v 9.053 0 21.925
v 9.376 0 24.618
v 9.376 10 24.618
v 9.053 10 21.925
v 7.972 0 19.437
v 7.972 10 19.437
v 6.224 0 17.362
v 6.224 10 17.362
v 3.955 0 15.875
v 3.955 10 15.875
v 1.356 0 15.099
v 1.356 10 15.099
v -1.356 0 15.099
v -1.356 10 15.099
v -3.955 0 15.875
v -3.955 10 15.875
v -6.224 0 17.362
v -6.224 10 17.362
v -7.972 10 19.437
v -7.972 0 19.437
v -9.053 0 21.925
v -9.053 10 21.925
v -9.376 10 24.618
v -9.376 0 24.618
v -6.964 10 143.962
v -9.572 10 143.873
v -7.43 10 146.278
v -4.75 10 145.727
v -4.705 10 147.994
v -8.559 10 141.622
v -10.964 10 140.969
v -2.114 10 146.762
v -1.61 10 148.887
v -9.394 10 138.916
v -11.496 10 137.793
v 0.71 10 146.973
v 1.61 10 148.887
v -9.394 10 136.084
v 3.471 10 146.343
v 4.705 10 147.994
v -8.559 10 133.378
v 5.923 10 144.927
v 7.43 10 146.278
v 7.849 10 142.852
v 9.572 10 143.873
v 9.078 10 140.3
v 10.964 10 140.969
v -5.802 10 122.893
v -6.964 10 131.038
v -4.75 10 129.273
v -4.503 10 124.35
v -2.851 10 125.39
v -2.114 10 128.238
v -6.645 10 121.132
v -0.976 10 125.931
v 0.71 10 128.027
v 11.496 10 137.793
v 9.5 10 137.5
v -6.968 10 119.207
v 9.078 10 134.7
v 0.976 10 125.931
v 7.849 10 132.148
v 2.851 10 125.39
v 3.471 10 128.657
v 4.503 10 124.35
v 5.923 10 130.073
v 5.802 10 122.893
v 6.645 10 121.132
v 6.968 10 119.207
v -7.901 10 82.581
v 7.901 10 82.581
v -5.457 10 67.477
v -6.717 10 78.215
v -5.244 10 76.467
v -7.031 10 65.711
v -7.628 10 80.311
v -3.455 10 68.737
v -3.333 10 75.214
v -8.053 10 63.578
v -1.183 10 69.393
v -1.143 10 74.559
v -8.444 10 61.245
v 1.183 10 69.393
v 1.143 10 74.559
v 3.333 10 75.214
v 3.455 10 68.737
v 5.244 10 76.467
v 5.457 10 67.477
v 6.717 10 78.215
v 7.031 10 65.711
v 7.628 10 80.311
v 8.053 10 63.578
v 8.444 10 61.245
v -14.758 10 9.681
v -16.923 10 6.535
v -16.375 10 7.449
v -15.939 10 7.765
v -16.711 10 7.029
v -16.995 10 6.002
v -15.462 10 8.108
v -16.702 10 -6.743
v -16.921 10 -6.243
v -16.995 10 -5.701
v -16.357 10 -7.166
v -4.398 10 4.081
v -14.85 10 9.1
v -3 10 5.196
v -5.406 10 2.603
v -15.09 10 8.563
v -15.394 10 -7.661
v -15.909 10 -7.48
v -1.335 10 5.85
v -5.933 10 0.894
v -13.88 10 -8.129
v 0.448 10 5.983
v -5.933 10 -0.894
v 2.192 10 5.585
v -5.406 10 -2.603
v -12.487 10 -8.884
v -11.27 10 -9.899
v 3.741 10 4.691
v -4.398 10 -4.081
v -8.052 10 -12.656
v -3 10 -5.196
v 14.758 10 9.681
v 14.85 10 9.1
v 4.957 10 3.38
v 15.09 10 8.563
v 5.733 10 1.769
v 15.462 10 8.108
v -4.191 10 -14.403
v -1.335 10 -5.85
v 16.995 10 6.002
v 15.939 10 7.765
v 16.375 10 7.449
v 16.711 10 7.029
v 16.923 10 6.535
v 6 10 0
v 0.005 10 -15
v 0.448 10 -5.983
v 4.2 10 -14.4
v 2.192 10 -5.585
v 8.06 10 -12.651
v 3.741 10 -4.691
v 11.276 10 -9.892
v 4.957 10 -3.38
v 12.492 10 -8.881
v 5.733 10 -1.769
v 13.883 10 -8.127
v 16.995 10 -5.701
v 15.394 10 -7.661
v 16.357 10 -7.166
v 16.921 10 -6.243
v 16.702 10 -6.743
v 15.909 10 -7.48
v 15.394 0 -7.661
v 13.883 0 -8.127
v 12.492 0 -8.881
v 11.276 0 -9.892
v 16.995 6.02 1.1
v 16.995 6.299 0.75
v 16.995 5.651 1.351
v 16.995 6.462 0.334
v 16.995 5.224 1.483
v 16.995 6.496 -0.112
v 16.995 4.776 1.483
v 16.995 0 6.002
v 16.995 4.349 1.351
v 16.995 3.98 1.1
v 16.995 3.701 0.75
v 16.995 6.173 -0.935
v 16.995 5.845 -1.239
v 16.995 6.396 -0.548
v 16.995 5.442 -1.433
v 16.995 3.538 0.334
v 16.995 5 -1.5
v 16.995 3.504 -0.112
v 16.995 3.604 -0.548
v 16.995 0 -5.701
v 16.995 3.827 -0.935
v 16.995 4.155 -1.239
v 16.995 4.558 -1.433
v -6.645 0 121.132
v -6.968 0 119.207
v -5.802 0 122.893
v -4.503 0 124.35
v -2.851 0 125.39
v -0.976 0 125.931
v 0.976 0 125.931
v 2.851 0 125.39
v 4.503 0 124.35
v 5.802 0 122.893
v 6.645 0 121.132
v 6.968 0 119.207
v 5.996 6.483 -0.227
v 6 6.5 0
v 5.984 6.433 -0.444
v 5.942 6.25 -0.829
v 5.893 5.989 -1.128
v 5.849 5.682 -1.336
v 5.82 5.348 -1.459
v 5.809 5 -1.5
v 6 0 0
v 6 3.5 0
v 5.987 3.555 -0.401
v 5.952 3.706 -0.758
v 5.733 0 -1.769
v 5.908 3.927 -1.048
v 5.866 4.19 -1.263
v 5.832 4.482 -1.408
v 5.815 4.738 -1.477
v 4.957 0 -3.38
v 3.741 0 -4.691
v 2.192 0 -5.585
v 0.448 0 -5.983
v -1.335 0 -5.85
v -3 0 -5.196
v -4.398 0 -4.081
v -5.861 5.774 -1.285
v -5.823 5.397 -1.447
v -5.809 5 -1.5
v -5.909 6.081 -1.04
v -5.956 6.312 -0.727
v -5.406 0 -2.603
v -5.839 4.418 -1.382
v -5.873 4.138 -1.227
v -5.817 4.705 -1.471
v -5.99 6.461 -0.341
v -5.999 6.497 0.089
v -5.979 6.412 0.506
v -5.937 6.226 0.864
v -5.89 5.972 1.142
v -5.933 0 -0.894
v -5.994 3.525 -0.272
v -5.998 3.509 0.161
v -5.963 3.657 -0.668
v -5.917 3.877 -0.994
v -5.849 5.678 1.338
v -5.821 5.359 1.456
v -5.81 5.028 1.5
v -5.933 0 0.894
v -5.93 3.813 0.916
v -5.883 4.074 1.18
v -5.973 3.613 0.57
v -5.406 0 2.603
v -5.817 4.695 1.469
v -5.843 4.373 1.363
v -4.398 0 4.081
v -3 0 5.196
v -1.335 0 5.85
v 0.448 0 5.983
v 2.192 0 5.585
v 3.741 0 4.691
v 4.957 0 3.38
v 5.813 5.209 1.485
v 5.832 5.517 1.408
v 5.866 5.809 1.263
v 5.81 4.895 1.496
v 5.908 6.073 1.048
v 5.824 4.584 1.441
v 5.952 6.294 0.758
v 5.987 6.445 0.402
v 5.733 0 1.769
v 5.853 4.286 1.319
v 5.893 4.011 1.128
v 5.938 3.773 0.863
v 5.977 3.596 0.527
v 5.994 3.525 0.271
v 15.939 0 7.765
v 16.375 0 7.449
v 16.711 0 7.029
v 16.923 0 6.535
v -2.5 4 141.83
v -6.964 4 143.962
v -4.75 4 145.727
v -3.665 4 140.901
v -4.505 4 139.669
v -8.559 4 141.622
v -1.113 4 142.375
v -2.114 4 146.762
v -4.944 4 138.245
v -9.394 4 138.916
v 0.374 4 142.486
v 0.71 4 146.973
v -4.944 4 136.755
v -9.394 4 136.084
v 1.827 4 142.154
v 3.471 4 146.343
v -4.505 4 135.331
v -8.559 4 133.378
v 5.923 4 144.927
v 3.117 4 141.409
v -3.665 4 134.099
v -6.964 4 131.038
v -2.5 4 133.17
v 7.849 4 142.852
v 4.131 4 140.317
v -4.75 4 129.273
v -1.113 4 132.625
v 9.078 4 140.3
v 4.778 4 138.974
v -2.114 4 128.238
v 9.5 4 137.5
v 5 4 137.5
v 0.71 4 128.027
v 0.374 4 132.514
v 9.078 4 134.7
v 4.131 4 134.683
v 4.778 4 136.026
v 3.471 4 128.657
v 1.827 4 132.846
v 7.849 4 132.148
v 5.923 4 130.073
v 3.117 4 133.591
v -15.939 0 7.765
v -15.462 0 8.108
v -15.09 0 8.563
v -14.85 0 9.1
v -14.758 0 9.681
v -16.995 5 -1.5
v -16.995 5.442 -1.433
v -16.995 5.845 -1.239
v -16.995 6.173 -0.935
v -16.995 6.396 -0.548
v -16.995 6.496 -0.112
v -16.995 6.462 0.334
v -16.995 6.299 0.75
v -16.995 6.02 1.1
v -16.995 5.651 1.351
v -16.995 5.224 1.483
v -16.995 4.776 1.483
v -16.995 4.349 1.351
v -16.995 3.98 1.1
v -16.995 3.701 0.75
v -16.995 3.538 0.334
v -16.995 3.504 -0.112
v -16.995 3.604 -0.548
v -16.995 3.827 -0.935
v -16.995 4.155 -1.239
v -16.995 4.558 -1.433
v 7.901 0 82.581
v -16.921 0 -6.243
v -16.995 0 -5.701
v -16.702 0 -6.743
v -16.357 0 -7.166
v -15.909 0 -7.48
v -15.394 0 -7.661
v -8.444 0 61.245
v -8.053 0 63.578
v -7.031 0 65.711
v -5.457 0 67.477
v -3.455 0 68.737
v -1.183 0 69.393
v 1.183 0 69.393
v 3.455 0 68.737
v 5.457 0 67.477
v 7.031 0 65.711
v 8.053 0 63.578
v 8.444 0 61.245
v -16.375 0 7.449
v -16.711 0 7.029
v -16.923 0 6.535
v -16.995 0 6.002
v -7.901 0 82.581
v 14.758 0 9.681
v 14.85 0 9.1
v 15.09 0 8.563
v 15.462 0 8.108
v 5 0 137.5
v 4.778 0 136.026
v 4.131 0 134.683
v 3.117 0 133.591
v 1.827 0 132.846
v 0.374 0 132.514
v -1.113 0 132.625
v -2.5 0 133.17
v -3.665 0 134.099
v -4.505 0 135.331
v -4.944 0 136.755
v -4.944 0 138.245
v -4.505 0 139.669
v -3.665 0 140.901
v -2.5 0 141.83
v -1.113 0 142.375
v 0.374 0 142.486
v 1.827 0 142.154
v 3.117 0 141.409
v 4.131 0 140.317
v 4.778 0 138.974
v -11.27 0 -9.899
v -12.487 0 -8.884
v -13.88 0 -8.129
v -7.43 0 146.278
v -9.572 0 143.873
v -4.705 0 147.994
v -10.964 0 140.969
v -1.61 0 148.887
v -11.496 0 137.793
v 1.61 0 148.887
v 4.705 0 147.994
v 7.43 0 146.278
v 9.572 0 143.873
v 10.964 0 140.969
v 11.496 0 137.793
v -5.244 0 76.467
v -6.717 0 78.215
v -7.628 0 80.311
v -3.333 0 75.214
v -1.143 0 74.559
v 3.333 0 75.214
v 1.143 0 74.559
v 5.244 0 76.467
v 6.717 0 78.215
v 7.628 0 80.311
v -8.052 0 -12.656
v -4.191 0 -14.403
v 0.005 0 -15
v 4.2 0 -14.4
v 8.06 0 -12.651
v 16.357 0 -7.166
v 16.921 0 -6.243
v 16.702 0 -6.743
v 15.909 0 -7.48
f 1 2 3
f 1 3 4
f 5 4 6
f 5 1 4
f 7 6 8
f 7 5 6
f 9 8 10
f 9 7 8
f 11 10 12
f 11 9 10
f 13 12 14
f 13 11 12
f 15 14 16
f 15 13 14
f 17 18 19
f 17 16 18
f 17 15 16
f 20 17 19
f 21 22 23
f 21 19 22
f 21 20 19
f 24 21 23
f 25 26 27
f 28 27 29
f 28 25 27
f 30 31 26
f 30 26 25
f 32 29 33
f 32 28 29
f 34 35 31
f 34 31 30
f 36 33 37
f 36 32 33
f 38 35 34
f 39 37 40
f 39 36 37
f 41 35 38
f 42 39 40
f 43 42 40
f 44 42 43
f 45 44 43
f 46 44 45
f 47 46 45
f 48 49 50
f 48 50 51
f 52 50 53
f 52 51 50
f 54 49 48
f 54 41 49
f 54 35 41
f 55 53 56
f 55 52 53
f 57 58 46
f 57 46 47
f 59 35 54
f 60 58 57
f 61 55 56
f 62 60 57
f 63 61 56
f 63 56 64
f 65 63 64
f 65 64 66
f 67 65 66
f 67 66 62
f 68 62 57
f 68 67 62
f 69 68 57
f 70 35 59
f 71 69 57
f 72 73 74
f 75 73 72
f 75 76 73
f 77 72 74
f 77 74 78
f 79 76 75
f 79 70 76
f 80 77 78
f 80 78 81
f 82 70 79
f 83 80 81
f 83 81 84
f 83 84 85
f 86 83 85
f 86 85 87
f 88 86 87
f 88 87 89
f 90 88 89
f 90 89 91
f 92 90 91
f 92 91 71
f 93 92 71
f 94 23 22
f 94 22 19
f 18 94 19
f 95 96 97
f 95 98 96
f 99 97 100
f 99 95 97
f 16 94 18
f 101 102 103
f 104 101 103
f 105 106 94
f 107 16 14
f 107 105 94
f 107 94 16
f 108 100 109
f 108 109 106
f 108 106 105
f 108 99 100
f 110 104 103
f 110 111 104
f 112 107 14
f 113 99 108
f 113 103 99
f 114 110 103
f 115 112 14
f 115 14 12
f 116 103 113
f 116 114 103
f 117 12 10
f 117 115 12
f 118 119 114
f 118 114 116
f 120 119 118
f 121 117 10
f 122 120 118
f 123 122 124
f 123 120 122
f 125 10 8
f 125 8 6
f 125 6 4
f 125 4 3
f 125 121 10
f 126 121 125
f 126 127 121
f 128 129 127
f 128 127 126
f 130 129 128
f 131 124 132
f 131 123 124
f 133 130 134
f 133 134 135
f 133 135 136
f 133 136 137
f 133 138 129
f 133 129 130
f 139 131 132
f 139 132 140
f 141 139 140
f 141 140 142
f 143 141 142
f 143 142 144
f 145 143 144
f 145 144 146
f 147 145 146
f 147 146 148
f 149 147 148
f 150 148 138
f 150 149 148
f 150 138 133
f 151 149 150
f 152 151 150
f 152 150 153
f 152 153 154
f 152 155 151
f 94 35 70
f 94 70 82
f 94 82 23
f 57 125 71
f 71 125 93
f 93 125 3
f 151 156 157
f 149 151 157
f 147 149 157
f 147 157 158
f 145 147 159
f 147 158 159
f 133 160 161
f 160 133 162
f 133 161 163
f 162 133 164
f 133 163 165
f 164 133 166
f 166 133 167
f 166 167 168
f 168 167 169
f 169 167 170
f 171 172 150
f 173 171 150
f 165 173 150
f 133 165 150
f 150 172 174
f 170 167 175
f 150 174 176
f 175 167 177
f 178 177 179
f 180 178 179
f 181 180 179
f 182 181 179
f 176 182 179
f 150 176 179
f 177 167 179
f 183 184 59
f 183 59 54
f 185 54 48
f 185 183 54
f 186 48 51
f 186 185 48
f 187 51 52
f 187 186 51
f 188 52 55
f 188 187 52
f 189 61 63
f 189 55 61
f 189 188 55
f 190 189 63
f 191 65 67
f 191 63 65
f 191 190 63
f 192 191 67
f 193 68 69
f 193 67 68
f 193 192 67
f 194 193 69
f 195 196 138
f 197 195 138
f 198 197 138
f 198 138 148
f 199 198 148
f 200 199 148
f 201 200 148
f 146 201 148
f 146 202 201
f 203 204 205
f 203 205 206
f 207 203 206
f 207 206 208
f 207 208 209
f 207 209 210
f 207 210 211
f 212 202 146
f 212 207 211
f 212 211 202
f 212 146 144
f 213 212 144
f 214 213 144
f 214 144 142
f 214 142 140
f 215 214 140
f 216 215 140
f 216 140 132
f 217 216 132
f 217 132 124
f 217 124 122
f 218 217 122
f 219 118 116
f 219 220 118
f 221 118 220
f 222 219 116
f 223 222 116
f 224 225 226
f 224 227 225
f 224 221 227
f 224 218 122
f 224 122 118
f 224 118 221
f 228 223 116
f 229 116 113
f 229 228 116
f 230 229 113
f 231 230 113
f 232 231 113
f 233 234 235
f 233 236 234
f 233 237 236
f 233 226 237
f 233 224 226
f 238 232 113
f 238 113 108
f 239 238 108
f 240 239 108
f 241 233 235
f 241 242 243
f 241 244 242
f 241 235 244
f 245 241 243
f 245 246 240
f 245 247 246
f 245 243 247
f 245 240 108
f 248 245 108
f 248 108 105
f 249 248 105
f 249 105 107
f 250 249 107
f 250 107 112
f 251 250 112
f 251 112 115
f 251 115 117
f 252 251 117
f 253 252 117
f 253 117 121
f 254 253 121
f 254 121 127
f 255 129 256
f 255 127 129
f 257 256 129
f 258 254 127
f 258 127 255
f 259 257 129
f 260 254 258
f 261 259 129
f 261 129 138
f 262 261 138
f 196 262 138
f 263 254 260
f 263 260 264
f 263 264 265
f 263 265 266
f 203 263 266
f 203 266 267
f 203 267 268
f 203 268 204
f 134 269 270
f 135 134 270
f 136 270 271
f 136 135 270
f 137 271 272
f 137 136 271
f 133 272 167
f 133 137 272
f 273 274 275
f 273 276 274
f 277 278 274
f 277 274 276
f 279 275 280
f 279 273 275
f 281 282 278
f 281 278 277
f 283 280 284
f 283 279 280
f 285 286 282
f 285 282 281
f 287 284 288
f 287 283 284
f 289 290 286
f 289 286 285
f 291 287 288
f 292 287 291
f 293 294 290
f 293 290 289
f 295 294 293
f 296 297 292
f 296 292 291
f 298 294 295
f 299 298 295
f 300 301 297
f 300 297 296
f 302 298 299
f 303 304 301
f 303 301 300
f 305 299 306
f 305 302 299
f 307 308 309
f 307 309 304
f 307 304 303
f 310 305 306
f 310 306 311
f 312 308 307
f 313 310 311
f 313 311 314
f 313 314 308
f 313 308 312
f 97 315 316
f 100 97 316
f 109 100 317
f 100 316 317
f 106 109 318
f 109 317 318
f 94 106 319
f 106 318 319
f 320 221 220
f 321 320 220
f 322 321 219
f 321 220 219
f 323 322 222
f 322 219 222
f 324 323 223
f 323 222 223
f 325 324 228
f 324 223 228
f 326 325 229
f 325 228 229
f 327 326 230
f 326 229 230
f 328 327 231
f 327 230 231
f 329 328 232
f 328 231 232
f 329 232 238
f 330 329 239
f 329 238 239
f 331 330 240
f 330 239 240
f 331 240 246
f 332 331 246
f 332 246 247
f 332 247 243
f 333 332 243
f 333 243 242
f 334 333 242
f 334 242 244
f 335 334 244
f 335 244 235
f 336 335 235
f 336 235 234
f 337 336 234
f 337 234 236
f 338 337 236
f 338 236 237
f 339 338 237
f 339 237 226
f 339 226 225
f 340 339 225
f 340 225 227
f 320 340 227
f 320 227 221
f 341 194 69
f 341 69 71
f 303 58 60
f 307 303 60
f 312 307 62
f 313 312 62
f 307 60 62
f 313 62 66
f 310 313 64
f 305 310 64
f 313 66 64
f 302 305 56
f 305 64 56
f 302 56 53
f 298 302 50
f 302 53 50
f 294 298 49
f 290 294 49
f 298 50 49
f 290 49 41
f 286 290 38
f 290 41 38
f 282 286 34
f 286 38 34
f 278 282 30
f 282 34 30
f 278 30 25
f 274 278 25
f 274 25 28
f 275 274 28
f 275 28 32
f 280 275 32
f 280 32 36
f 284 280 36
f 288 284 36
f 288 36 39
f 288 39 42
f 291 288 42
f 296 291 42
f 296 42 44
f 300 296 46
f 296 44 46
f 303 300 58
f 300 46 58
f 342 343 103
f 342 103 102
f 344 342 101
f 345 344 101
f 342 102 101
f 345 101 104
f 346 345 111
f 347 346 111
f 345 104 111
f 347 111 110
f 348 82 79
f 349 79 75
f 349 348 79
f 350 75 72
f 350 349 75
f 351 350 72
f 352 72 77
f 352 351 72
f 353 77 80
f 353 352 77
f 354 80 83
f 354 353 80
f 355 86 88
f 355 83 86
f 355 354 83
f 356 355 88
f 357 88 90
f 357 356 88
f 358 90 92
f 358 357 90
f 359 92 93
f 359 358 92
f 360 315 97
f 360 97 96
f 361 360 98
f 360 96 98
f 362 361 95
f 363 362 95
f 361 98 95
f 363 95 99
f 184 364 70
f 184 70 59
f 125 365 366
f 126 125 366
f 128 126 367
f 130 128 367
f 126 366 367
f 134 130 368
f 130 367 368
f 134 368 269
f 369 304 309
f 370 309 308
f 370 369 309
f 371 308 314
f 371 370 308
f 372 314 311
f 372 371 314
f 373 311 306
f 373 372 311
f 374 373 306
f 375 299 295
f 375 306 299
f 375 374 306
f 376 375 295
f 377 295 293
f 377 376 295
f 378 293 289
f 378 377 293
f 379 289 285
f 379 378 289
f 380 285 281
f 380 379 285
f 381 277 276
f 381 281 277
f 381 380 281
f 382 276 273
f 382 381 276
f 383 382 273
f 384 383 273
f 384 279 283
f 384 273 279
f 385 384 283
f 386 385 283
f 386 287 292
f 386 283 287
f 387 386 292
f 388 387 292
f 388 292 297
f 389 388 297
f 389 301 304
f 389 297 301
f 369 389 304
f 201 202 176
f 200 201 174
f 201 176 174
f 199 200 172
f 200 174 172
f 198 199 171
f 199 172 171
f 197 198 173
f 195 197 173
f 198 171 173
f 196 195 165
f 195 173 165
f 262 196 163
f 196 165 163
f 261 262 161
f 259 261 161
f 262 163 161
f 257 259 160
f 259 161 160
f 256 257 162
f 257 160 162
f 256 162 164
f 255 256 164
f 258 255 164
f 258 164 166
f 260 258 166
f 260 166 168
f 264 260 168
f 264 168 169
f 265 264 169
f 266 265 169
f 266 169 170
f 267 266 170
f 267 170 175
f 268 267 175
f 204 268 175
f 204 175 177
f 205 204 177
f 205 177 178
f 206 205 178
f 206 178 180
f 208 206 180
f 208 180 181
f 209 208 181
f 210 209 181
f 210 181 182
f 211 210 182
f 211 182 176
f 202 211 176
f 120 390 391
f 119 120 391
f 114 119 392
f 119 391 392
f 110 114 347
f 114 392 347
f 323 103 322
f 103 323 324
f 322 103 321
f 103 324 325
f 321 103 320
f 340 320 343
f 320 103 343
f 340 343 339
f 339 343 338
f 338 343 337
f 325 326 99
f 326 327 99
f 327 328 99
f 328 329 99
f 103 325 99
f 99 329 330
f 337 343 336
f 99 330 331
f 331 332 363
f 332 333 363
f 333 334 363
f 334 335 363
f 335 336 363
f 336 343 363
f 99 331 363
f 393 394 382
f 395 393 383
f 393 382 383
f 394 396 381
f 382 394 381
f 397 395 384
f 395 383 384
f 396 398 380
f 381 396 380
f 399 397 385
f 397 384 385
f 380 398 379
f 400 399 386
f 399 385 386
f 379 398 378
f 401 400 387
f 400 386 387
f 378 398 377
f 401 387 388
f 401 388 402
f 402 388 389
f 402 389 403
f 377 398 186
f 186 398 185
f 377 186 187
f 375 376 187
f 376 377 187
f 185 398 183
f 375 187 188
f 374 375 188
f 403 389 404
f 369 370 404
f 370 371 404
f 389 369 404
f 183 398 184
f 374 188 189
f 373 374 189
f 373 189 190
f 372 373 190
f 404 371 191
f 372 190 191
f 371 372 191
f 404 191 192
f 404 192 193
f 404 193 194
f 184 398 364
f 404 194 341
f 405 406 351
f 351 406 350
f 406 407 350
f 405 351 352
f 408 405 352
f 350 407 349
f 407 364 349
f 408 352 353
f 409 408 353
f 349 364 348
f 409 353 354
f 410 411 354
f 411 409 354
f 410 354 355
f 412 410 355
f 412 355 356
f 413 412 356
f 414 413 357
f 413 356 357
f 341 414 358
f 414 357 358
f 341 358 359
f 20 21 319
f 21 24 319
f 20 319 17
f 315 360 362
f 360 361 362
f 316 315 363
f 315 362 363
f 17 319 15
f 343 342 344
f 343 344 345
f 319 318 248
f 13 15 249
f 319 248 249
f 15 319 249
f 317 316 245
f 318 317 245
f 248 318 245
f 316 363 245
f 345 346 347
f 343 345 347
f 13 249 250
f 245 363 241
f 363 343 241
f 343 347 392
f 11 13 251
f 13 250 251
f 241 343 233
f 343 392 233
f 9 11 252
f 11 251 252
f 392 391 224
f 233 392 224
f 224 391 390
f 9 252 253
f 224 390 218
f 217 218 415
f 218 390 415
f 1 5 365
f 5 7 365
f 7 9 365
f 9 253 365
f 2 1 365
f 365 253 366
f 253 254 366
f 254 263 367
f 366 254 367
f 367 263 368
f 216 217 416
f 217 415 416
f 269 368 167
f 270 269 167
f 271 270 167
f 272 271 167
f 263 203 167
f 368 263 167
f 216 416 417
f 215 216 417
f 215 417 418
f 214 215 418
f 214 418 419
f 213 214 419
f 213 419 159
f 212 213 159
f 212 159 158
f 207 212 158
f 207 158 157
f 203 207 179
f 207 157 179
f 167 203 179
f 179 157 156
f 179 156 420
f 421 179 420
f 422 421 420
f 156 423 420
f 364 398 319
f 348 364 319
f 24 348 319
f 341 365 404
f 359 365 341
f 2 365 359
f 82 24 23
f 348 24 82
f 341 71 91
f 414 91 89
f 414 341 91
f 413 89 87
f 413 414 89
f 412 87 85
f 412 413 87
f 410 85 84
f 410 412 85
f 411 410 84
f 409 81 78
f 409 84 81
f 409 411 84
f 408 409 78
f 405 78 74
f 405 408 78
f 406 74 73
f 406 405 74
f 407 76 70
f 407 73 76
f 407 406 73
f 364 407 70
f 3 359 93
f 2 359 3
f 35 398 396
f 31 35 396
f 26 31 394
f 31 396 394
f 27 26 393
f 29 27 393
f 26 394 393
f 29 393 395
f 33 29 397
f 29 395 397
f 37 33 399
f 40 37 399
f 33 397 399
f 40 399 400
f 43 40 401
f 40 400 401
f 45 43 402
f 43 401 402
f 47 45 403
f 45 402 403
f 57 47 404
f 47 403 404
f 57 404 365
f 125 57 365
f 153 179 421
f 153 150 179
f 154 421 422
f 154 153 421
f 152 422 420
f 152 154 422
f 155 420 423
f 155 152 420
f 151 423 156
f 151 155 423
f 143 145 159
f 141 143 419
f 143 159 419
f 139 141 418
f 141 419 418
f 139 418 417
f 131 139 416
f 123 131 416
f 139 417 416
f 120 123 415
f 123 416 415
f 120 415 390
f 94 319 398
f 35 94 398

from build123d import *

# Parameters (mm, degrees)
SKETCH1_R           = 6
SKETCH1_R_2         = 5
BOSS_EXTRUDE1_DEPTH = 10
SKETCH2_R           = 9.5
CUT_EXTRUDE1_DEPTH  = 6
CUT_EXTRUDE3_DEPTH  = 11
FILLET1_R           = 2
M4_TAPPED_HOLE1_D   = 3


with BuildPart() as part:
    # Sketch1 → Boss-Extrude1 (new body)
    with BuildSketch(Plane(origin=(0, 0, 0), x_dir=(1, 0, 0), z_dir=(0, 1, 0))):
        with BuildLine():
            Line((-14.758368201, -9.680542044), (-11.496273776, -137.792727273))
            ThreePointArc((-11.496273776, -137.792727273), (0, -149), (11.496273776, -137.792727273))
            Line((11.496273776, -137.792727273), (14.758368201, -9.680542044))
            ThreePointArc((14.758368201, -9.680542044), (15.433257, -8.135337646), (16.995139708, -7.5))
            Line((16.995139708, -7.5), (16.995139708, 7.5))
            ThreePointArc((16.995139708, 7.5), (13.895638119, 8.122041636), (11.276155185, 9.891831188))
            ThreePointArc((11.276155185, 9.891831188), (0.004561048, 14.999999307), (-11.270137484, 9.898686836))
            ThreePointArc((-11.270137484, 9.898686836), (-13.891539017, 8.123905388), (-16.995139708, 7.5))
            Line((-16.995139708, 7.5), (-16.995139708, -7.5))
            ThreePointArc((-16.995139708, -7.5), (-15.433257, -8.135337646), (-14.758368201, -9.680542044))
        make_face()
        Circle(SKETCH1_R, mode=Mode.SUBTRACT)
        with Locations((0, -137.5)):
            Circle(SKETCH1_R_2, mode=Mode.SUBTRACT)
    extrude(amount=BOSS_EXTRUDE1_DEPTH)

    # Sketch2 → Cut-Extrude1 (cut)
    with BuildSketch(Plane(origin=(0, 10, 0), x_dir=(1, 0, 0), z_dir=(0, 1, 0))):
        with Locations((0, -137.5)):
            Circle(SKETCH2_R)
    extrude(amount=-CUT_EXTRUDE1_DEPTH, mode=Mode.SUBTRACT)

    # Sketch4 → Cut-Extrude3 (cut, through all)
    with BuildSketch(Plane(origin=(0, 0, 0), x_dir=(1, 0, 0), z_dir=(0, 1, 0))):
        with BuildLine():
            Line((-9.376393506, -24.618181818), (-8.443776056, -61.244852893))
            ThreePointArc((-8.443776056, -61.244852893), (0, -69.476363636), (8.443776056, -61.244852893))
            Line((8.443776056, -61.244852893), (9.376393506, -24.618181818))
            ThreePointArc((9.376393506, -24.618181818), (0, -15), (-9.376393506, -24.618181818))
        make_face()
        with BuildLine():
            Line((-7.90050824, -82.580601653), (-6.96789079, -119.207272727))
            ThreePointArc((-6.96789079, -119.207272727), (0, -126), (6.96789079, -119.207272727))
            Line((6.96789079, -119.207272727), (7.90050824, -82.580601653))
            ThreePointArc((7.90050824, -82.580601653), (0, -74.476363636), (-7.90050824, -82.580601653))
        make_face()
    extrude(amount=CUT_EXTRUDE3_DEPTH, mode=Mode.SUBTRACT)

    # Fillet1
    fillet1_edges = [part.edges().sort_by_distance(p)[0] for p in [
        (-16.995139708, 5, 7.5),
        (-16.995139708, 5, -7.5),
        (16.995139708, 5, -7.5),
        (16.995139708, 5, 7.5),
    ]]
    fillet(fillet1_edges, radius=FILLET1_R)

    # M4 Tapped Hole1 (through all)
    with Locations(Plane.ZY.offset(16.995139708)):
        with Locations((0, 5)):
            Hole(M4_TAPPED_HOLE1_D / 2)


solid = part.part
